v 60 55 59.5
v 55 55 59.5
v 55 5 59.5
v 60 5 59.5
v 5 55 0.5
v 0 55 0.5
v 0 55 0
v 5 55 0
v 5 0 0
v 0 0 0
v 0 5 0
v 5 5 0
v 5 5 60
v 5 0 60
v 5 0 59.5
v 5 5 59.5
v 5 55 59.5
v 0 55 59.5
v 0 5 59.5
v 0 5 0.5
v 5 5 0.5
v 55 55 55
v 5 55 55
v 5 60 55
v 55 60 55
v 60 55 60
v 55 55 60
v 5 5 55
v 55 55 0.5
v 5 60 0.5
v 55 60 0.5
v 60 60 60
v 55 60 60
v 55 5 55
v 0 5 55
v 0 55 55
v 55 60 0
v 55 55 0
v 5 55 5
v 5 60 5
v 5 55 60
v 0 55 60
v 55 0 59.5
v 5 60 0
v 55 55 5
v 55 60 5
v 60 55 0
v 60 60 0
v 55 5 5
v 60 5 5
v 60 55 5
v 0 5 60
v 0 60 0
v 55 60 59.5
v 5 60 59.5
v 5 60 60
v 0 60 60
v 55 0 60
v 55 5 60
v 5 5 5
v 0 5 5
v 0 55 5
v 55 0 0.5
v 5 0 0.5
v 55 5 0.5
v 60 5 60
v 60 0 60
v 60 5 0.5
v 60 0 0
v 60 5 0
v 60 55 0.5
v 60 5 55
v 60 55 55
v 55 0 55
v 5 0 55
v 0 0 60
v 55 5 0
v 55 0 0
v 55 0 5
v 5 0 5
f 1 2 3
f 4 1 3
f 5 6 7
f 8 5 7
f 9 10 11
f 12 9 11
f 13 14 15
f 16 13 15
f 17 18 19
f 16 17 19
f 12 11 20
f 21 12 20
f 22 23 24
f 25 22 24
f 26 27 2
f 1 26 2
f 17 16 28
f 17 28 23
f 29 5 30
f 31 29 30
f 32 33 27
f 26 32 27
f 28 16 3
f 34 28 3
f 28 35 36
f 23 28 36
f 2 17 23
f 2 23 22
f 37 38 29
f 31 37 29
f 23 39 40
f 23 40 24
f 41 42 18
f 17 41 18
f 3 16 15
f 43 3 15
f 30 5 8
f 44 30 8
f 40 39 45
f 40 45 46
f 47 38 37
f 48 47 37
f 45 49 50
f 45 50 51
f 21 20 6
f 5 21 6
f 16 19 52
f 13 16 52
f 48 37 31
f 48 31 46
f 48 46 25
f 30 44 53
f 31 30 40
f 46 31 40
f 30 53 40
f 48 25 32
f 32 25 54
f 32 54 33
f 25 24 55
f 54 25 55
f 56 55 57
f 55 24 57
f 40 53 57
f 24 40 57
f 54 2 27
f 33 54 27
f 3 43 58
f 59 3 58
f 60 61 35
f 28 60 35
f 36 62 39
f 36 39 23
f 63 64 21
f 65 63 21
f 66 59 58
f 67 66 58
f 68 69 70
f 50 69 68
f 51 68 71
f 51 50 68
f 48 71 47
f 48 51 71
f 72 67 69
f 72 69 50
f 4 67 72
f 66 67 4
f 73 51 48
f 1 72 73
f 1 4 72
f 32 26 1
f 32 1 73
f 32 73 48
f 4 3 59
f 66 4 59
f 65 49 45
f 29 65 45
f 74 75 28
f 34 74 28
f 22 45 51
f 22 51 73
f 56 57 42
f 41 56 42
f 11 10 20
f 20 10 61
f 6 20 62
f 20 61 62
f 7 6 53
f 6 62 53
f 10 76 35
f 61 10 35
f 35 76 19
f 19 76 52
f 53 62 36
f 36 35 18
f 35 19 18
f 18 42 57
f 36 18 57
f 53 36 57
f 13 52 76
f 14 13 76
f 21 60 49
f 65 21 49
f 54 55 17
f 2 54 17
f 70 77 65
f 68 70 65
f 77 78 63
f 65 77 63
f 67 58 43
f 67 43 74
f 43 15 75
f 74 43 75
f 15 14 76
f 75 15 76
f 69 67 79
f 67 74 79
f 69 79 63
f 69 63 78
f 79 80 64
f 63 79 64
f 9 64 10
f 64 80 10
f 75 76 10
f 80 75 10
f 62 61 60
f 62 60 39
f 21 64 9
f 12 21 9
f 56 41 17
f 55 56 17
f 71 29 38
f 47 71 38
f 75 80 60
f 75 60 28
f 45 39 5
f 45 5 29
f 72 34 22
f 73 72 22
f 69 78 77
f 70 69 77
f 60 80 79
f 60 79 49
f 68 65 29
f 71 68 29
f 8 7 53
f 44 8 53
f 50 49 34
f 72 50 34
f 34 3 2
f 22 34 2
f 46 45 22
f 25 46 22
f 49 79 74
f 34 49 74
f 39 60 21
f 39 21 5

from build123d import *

# Parameters (mm, degrees)
F0_W     = 50
F0_H     = 50
F1_DEPTH = 60
F3_DEPTH = 60
F2_W     = 50
F2_H     = 50
F2_H_2   = 19.5
F2_H_3   = 0.5
F2_H_4   = 15
F4_DEPTH = 60
F6_W     = 50
F6_H     = 50
F7_DEPTH = 60


with BuildPart() as f1:
    # F0 (on Right) → F1 (new body)
    with BuildSketch(Plane.YZ):
        Polygon((55, 59.5), (5, 59.5), (5, 60), (0, 60), (0, 0), (5, 0), (5, 0.5), (55, 0.5), (55, 0), (60, 0), (60, 60), (55, 60), align=None)
        with Locations((30, 30)):
            Rectangle(F0_W, F0_H, mode=Mode.SUBTRACT)
    extrude(amount=F1_DEPTH)

    # F0 (on Right) → F3 (join)
    with BuildSketch(Plane.YZ):
        Polygon((55, 59.5), (5, 59.5), (5, 60), (0, 60), (0, 0), (5, 0), (5, 0.5), (55, 0.5), (55, 0), (60, 0), (60, 60), (55, 60), align=None)
        with Locations((30, 30)):
            Rectangle(F0_W, F0_H, mode=Mode.SUBTRACT)
    extrude(amount=F3_DEPTH)

    # F2 (on face) → F4 (cut)
    with BuildSketch(Plane.XZ):
        with Locations((30, 30)):
            Rectangle(F2_W, F2_H)
        with Locations((30, -9.75)):
            Rectangle(F2_W, F2_H_2)
        with Locations((30, 59.75)):
            Rectangle(F2_W, F2_H_3)
        with Locations((30, 0.25)):
            Rectangle(F2_W, F2_H_3)
        with Locations((30, 67.5)):
            Rectangle(F2_W, F2_H_4)
    extrude(amount=-F4_DEPTH, mode=Mode.SUBTRACT)

    # F6 (on offset) → F7 (cut)
    with BuildSketch(Plane.XY.offset(60)):
        with Locations((30, 30)):
            Rectangle(F6_W, F6_H)
    extrude(amount=-F7_DEPTH, mode=Mode.SUBTRACT)


solid = f1.part
